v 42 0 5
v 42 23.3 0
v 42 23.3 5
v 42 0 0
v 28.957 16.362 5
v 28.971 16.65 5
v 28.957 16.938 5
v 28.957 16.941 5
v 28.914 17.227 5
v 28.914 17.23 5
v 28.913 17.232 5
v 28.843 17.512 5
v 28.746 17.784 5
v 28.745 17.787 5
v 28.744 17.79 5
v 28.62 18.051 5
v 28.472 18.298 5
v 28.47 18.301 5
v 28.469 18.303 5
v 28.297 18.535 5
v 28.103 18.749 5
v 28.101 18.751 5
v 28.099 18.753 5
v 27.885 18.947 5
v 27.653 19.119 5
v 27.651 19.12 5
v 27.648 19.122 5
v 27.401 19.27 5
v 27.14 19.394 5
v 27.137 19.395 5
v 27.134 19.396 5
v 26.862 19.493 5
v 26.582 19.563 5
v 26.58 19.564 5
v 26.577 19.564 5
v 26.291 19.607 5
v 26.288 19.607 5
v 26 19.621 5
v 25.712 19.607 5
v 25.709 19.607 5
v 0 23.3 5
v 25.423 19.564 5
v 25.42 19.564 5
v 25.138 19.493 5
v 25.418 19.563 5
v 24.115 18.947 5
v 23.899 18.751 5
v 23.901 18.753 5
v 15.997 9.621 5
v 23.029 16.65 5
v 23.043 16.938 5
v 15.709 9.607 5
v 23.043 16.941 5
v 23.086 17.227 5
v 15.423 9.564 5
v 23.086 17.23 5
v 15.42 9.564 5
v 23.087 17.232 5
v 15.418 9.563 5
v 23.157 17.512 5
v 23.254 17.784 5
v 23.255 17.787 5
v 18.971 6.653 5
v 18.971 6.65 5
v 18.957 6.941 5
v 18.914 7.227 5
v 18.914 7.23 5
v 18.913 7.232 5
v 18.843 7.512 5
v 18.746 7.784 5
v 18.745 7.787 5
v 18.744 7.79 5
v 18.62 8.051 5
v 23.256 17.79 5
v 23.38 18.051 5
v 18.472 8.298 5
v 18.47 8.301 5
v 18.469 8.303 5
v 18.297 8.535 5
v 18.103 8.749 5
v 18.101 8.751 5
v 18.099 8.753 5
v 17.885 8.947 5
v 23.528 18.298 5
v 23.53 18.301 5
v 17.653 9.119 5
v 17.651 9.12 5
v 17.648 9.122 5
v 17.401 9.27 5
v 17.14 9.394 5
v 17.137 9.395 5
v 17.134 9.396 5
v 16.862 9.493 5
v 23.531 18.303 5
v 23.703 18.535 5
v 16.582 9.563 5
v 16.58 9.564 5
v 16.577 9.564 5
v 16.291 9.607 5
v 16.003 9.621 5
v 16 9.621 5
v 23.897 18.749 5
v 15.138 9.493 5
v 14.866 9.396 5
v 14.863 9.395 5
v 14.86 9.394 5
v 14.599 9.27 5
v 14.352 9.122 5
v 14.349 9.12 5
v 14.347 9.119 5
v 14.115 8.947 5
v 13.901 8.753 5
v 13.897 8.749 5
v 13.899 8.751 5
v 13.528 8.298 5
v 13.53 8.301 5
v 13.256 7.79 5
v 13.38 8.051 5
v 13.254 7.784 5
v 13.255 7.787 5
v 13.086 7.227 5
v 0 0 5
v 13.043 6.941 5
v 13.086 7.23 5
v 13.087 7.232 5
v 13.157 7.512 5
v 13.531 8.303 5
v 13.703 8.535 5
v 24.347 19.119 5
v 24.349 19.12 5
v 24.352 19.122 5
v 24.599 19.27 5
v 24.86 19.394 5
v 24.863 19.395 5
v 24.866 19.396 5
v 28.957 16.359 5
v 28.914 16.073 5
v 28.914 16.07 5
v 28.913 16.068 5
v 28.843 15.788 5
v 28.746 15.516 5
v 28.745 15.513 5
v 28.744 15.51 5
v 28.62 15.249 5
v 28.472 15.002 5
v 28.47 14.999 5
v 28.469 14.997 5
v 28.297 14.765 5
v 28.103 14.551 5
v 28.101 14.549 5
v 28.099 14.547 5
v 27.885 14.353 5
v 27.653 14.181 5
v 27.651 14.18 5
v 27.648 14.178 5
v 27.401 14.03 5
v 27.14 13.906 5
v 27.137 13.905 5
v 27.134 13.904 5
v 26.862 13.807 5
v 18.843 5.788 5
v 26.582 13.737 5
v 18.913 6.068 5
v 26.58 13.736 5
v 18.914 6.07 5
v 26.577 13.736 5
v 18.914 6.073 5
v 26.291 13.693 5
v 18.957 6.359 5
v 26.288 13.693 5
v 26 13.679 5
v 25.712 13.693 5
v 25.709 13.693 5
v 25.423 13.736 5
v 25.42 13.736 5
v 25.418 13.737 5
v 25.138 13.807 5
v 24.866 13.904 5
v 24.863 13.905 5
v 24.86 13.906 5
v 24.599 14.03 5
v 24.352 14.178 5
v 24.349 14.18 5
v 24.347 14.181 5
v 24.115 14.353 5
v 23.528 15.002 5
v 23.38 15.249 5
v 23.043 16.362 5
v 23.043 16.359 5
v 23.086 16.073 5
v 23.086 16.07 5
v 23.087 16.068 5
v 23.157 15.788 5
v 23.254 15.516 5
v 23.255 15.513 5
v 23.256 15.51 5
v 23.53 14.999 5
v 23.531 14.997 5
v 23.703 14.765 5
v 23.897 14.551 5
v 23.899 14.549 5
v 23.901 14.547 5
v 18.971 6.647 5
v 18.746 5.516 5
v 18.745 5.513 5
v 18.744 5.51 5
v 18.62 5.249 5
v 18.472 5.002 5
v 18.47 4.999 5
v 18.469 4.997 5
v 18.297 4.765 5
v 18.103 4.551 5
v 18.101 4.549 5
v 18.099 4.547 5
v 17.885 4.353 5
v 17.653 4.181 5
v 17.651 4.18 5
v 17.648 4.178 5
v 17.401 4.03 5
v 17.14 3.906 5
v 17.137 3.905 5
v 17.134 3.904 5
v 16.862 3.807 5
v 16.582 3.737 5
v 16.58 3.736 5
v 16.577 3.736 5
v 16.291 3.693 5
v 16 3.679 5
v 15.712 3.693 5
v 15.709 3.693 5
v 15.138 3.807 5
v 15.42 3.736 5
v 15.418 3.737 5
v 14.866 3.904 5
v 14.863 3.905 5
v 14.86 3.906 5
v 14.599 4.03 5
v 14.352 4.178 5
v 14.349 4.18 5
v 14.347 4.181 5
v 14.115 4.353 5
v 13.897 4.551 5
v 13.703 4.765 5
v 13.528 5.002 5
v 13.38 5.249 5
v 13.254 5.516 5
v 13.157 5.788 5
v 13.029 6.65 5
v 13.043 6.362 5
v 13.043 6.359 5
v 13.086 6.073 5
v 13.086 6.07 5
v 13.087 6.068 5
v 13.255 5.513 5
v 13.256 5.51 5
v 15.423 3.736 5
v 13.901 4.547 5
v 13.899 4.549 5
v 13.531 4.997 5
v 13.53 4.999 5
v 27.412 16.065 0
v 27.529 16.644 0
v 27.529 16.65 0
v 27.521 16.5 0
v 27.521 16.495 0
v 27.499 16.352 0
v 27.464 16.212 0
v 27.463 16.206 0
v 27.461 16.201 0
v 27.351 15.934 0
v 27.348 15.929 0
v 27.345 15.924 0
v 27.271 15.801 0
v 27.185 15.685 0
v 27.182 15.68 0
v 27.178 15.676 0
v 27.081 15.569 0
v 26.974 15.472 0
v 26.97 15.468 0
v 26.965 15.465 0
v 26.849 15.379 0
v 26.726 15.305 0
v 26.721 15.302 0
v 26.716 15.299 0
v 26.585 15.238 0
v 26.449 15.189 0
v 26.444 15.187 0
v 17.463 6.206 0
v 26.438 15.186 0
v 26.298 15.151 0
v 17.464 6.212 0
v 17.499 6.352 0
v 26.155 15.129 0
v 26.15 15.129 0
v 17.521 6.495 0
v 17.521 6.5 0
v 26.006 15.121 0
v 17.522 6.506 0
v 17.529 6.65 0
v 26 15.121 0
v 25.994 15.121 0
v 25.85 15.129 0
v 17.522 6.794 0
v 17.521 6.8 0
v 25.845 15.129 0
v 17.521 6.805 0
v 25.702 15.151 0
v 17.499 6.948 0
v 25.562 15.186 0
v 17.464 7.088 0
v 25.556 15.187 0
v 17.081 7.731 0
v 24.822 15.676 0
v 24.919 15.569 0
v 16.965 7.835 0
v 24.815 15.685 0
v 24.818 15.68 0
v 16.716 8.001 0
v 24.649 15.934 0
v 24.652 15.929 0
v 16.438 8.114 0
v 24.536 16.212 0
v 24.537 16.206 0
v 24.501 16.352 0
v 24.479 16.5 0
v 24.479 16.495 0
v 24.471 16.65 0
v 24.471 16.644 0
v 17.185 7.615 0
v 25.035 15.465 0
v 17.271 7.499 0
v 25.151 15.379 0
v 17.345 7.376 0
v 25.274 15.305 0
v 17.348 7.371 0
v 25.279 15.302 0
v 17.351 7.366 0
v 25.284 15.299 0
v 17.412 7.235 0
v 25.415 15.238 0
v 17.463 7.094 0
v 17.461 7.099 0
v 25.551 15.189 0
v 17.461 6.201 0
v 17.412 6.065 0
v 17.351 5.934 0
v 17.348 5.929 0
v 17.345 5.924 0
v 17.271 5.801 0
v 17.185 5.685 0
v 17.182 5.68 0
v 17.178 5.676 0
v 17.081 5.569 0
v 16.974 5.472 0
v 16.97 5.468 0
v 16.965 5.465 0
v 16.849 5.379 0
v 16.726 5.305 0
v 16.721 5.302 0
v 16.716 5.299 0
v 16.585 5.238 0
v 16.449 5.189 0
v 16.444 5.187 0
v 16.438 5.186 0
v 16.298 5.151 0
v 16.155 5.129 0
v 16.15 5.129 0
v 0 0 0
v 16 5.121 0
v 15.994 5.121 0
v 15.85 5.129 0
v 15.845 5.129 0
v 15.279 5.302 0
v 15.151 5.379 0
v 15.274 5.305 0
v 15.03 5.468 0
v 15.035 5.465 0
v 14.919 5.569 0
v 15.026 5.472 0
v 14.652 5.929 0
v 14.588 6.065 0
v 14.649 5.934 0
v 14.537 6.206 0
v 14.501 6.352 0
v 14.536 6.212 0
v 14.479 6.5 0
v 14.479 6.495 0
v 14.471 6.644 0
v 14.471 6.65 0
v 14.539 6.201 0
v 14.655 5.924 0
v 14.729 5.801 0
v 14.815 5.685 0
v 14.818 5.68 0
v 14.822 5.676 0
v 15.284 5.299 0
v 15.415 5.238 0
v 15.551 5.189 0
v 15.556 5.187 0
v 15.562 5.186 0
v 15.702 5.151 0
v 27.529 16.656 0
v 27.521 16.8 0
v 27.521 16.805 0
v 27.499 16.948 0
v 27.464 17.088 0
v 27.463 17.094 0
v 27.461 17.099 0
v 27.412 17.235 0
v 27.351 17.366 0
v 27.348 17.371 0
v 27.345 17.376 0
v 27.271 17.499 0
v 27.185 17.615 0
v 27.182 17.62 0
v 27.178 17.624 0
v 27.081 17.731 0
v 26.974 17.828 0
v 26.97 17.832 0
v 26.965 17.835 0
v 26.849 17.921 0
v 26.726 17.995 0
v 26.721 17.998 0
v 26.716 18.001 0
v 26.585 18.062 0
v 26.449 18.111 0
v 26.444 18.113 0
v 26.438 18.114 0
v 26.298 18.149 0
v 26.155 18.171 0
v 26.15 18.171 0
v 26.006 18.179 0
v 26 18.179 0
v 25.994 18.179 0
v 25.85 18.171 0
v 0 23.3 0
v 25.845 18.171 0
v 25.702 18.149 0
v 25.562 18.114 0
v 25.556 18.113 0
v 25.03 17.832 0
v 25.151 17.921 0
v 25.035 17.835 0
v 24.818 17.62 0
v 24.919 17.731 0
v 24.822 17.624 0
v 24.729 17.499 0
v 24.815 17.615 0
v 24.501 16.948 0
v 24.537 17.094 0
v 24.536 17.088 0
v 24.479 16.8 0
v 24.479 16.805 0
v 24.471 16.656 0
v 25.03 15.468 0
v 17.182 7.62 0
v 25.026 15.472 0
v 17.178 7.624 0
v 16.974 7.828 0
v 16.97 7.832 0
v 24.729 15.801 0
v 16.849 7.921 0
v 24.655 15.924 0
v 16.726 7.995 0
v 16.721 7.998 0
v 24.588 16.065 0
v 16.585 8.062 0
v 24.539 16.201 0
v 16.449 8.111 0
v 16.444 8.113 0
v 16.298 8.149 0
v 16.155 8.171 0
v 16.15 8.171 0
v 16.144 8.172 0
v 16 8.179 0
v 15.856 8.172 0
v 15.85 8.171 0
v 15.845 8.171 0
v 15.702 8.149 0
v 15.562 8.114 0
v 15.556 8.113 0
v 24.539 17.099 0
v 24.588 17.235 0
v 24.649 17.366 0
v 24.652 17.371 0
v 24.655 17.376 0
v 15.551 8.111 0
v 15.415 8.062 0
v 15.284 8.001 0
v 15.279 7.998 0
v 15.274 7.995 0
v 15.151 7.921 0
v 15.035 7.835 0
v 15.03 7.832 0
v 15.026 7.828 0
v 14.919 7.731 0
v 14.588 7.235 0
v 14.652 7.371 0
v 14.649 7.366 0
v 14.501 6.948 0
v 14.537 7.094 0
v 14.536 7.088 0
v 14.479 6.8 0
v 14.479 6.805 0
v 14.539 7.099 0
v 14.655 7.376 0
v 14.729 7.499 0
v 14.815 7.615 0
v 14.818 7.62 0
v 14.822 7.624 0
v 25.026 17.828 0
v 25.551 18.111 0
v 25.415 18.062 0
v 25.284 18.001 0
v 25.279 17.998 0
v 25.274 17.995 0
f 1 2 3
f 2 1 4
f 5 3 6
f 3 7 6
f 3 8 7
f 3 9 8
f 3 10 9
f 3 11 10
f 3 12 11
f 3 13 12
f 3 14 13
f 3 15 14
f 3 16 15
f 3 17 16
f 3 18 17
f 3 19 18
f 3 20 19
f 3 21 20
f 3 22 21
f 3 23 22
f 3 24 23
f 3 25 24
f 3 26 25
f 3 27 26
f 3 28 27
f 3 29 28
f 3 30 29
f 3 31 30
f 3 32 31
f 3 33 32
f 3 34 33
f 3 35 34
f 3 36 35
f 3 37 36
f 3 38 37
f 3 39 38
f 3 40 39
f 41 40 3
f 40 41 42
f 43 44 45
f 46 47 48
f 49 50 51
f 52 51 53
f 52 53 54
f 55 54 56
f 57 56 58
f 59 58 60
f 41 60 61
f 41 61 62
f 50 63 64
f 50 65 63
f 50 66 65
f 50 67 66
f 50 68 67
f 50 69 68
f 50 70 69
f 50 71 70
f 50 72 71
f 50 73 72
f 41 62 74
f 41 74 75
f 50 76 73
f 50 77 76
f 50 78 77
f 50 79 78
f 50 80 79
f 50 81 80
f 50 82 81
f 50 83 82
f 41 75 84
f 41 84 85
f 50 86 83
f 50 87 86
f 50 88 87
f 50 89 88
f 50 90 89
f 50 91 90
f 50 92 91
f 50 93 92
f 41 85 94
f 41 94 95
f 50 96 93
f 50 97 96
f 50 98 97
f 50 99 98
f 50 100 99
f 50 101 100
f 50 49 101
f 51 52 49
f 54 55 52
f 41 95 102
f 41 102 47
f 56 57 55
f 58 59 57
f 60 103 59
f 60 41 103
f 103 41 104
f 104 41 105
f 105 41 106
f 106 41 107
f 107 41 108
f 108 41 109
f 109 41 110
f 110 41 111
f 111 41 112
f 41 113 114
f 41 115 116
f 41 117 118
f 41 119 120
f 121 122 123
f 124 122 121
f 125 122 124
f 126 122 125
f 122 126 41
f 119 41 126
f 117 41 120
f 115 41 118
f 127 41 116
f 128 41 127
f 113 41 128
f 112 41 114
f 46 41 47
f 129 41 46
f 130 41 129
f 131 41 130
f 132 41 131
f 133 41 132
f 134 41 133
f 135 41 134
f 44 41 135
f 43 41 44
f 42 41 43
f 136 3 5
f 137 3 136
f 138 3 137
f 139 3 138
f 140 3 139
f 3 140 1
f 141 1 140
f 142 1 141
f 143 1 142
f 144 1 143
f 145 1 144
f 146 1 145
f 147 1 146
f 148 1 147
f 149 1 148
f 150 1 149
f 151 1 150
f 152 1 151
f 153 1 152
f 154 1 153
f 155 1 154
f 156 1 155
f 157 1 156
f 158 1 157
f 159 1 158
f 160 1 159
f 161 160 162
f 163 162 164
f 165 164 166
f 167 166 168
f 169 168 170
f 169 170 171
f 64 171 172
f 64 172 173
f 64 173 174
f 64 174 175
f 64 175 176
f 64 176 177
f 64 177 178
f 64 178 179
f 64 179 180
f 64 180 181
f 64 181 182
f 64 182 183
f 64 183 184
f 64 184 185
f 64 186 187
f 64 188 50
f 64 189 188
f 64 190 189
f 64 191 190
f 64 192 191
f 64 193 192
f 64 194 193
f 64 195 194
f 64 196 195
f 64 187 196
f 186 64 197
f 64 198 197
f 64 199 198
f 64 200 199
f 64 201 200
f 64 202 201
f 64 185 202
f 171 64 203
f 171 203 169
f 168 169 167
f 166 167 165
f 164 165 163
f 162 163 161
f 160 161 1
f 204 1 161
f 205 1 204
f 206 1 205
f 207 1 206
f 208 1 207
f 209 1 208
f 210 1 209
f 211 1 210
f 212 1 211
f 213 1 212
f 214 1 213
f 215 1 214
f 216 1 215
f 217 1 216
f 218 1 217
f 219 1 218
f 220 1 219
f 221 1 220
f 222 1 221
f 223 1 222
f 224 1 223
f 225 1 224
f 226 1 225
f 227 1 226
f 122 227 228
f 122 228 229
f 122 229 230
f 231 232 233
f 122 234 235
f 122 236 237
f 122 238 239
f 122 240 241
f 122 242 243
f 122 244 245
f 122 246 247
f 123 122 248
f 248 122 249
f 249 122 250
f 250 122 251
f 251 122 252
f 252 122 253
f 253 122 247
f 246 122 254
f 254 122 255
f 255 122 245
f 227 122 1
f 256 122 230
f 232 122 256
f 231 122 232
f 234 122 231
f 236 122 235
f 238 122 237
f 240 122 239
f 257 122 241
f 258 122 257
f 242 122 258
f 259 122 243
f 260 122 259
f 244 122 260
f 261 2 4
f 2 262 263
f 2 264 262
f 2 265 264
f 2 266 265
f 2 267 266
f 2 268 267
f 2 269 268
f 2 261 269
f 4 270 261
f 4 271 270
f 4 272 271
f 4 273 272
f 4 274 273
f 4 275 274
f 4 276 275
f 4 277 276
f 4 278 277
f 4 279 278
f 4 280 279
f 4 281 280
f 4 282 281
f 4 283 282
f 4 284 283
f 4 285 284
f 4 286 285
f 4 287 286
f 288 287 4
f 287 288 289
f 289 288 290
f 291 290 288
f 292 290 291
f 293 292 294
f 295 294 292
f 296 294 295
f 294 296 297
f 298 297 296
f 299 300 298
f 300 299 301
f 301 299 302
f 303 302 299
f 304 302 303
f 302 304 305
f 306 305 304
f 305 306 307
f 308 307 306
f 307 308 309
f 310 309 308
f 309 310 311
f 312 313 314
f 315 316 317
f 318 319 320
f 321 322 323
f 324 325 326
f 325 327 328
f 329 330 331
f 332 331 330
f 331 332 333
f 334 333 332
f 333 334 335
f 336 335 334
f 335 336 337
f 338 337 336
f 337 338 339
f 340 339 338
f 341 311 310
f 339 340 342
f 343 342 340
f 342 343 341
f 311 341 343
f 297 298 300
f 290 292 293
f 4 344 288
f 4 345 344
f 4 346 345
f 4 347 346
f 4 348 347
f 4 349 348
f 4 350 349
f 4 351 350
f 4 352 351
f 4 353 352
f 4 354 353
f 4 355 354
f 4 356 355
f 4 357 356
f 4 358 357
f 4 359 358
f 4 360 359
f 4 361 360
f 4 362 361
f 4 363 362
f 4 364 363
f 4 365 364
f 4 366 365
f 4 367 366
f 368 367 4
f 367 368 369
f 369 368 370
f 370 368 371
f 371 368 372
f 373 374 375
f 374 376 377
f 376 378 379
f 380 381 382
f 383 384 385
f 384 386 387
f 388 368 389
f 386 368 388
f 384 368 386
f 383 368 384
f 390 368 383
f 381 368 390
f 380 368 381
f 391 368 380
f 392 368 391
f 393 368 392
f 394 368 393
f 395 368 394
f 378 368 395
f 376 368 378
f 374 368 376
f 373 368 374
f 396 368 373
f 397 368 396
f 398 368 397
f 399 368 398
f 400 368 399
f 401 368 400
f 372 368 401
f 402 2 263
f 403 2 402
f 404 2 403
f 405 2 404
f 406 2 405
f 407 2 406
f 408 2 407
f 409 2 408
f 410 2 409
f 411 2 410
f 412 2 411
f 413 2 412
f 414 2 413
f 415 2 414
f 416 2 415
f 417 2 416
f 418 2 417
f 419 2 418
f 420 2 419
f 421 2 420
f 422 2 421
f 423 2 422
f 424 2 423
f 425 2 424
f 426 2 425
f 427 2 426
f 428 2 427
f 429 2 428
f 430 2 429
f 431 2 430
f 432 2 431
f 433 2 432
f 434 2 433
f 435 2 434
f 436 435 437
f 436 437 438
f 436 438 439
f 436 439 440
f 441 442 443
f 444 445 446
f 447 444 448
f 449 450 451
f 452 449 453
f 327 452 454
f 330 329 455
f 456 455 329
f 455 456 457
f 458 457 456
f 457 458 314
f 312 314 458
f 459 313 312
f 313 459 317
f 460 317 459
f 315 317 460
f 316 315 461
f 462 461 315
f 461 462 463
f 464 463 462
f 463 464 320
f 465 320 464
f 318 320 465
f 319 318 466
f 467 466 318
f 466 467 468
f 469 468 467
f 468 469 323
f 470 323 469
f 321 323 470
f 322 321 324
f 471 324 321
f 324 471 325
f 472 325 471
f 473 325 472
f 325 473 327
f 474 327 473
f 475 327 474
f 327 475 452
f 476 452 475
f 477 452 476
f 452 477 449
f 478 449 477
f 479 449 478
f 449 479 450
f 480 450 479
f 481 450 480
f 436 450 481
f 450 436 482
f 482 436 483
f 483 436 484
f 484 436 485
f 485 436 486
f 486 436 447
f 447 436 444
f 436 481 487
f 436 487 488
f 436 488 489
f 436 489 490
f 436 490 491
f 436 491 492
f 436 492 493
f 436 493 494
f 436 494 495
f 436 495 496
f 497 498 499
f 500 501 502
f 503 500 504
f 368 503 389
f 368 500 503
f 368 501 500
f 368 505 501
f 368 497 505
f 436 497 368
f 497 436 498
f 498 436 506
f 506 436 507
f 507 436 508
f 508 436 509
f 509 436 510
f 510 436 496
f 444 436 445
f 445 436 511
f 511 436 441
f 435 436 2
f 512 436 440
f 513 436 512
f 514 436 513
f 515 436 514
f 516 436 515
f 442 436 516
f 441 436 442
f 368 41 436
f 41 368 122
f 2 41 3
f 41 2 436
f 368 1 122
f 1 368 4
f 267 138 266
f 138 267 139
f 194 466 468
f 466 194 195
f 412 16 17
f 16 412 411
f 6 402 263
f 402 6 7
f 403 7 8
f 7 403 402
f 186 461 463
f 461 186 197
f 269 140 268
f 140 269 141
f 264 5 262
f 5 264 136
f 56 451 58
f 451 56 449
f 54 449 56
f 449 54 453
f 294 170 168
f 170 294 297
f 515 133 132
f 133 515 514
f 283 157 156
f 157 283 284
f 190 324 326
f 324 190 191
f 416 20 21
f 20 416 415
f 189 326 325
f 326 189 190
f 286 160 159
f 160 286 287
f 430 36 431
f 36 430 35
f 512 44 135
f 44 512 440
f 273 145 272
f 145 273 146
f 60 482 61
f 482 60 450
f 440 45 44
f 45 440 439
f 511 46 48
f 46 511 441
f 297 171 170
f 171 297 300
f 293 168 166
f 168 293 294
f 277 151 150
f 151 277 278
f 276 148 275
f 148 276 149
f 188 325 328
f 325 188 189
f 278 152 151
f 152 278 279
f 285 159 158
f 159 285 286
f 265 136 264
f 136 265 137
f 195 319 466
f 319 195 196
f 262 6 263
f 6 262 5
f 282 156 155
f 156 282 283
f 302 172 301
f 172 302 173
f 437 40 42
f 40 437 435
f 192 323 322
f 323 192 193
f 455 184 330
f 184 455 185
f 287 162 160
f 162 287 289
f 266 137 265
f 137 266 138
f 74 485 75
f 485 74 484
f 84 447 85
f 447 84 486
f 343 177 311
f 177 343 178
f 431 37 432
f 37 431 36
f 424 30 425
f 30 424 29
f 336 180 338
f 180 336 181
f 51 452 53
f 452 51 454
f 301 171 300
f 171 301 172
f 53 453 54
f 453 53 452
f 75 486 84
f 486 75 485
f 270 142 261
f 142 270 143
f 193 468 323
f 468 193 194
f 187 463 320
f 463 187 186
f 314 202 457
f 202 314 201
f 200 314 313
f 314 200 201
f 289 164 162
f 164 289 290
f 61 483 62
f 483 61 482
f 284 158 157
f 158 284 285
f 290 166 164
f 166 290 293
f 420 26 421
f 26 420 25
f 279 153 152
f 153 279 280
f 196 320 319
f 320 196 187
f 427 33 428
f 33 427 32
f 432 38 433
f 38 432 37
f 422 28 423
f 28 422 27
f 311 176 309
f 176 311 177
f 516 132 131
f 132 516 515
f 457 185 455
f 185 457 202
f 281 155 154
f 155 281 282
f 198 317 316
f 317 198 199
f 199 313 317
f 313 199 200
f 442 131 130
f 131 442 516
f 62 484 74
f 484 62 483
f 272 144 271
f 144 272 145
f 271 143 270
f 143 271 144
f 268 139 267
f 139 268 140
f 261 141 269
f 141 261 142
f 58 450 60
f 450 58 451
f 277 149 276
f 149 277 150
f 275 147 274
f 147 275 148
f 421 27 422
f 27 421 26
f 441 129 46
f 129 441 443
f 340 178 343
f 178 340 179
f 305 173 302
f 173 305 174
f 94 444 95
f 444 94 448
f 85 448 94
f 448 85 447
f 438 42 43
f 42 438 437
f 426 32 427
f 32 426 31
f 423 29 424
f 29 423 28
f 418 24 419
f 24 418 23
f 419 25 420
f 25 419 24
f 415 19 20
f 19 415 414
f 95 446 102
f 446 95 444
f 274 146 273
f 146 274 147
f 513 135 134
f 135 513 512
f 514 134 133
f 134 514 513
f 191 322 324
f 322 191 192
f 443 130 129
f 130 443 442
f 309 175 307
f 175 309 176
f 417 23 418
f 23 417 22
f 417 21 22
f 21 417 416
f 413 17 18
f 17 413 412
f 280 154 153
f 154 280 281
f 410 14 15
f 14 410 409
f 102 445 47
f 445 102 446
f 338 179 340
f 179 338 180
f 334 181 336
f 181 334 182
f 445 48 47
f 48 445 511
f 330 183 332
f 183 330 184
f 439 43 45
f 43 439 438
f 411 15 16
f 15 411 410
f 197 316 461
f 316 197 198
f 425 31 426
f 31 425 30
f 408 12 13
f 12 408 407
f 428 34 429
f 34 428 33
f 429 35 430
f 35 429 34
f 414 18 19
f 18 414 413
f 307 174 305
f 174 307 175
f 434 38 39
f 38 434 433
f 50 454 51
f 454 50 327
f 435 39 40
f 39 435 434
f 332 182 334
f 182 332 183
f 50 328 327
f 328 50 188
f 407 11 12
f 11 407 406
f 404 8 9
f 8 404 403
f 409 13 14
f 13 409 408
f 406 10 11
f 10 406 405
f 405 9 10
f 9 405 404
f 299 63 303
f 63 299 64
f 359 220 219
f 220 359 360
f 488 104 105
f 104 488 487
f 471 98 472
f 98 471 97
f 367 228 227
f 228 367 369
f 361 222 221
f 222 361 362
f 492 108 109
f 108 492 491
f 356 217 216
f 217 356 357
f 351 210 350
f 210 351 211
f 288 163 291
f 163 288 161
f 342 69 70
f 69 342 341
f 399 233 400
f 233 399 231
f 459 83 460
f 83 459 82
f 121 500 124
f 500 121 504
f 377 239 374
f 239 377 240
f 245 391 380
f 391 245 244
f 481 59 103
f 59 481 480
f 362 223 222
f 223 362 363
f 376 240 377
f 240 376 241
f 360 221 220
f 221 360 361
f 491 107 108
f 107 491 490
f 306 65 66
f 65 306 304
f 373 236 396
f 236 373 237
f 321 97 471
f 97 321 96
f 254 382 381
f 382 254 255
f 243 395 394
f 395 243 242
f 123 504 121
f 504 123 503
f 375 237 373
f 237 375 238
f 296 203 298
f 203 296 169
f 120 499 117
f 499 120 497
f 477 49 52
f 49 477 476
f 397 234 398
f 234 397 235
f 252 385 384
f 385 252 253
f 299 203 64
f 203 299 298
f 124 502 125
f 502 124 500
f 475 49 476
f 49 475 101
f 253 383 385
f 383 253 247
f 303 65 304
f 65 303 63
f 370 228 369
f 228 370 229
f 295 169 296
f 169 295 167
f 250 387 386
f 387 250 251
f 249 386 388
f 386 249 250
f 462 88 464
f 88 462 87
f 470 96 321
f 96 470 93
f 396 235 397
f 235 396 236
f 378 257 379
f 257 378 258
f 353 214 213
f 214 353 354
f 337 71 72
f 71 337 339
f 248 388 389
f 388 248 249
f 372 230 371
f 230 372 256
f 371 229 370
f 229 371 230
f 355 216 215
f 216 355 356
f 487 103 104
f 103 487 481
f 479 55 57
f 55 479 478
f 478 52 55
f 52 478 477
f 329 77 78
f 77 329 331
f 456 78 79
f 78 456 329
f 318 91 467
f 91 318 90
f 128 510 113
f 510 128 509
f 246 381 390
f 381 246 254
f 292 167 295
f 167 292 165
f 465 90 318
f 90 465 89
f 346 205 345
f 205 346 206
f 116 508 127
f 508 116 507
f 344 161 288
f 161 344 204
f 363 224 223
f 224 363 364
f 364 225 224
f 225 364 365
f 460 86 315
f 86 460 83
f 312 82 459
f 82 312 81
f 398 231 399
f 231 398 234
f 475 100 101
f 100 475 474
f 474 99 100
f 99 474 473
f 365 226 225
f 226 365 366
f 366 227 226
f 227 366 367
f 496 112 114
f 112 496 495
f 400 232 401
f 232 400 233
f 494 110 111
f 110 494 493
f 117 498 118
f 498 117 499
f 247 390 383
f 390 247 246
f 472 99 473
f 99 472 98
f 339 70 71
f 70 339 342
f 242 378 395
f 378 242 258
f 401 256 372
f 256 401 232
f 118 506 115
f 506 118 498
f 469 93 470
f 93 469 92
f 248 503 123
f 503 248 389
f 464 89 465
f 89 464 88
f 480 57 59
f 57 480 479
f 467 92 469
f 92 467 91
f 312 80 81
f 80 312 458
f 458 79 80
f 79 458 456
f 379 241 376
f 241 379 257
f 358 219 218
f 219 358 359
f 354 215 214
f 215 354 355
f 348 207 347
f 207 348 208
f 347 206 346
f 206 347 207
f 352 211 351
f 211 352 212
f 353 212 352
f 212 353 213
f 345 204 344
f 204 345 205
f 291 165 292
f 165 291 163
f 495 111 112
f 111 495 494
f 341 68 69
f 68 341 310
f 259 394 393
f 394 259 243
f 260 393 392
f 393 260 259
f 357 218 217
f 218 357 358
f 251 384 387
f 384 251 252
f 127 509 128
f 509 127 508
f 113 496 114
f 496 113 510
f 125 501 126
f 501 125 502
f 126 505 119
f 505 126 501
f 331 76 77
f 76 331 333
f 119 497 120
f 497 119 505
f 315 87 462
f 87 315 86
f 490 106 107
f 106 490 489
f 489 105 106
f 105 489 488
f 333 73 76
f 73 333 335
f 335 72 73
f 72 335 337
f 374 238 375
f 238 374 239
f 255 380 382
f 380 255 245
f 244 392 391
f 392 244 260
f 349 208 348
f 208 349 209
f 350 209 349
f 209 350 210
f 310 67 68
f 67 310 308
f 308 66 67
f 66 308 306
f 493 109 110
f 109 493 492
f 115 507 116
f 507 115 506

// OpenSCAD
module Anchor(){
  translate([21, 11.65, 0])color("SteelBlue")difference(){
        translate([5, 5, 0])difference(){
            translate([-5, -5, 0])difference(){
                translate([-21, -11.65, 0])cube([42, 23.3, 5.0]);
                translate([5, 5, -0.1])cylinder(d=3,h=5.2,$fn=64);
                translate([-5, -5, -0.1])cylinder(d=3,h=5.2,$fn=64);
              }

            translate([0, 0, -0.1])cylinder(d1=3,d2=6,h=5.2,$fn=64);
          }

        translate([-5, -5, -0.1])cylinder(d1=3,d2=6,h=5.2,$fn=64);
      }
}
$fn=64;
Anchor();
